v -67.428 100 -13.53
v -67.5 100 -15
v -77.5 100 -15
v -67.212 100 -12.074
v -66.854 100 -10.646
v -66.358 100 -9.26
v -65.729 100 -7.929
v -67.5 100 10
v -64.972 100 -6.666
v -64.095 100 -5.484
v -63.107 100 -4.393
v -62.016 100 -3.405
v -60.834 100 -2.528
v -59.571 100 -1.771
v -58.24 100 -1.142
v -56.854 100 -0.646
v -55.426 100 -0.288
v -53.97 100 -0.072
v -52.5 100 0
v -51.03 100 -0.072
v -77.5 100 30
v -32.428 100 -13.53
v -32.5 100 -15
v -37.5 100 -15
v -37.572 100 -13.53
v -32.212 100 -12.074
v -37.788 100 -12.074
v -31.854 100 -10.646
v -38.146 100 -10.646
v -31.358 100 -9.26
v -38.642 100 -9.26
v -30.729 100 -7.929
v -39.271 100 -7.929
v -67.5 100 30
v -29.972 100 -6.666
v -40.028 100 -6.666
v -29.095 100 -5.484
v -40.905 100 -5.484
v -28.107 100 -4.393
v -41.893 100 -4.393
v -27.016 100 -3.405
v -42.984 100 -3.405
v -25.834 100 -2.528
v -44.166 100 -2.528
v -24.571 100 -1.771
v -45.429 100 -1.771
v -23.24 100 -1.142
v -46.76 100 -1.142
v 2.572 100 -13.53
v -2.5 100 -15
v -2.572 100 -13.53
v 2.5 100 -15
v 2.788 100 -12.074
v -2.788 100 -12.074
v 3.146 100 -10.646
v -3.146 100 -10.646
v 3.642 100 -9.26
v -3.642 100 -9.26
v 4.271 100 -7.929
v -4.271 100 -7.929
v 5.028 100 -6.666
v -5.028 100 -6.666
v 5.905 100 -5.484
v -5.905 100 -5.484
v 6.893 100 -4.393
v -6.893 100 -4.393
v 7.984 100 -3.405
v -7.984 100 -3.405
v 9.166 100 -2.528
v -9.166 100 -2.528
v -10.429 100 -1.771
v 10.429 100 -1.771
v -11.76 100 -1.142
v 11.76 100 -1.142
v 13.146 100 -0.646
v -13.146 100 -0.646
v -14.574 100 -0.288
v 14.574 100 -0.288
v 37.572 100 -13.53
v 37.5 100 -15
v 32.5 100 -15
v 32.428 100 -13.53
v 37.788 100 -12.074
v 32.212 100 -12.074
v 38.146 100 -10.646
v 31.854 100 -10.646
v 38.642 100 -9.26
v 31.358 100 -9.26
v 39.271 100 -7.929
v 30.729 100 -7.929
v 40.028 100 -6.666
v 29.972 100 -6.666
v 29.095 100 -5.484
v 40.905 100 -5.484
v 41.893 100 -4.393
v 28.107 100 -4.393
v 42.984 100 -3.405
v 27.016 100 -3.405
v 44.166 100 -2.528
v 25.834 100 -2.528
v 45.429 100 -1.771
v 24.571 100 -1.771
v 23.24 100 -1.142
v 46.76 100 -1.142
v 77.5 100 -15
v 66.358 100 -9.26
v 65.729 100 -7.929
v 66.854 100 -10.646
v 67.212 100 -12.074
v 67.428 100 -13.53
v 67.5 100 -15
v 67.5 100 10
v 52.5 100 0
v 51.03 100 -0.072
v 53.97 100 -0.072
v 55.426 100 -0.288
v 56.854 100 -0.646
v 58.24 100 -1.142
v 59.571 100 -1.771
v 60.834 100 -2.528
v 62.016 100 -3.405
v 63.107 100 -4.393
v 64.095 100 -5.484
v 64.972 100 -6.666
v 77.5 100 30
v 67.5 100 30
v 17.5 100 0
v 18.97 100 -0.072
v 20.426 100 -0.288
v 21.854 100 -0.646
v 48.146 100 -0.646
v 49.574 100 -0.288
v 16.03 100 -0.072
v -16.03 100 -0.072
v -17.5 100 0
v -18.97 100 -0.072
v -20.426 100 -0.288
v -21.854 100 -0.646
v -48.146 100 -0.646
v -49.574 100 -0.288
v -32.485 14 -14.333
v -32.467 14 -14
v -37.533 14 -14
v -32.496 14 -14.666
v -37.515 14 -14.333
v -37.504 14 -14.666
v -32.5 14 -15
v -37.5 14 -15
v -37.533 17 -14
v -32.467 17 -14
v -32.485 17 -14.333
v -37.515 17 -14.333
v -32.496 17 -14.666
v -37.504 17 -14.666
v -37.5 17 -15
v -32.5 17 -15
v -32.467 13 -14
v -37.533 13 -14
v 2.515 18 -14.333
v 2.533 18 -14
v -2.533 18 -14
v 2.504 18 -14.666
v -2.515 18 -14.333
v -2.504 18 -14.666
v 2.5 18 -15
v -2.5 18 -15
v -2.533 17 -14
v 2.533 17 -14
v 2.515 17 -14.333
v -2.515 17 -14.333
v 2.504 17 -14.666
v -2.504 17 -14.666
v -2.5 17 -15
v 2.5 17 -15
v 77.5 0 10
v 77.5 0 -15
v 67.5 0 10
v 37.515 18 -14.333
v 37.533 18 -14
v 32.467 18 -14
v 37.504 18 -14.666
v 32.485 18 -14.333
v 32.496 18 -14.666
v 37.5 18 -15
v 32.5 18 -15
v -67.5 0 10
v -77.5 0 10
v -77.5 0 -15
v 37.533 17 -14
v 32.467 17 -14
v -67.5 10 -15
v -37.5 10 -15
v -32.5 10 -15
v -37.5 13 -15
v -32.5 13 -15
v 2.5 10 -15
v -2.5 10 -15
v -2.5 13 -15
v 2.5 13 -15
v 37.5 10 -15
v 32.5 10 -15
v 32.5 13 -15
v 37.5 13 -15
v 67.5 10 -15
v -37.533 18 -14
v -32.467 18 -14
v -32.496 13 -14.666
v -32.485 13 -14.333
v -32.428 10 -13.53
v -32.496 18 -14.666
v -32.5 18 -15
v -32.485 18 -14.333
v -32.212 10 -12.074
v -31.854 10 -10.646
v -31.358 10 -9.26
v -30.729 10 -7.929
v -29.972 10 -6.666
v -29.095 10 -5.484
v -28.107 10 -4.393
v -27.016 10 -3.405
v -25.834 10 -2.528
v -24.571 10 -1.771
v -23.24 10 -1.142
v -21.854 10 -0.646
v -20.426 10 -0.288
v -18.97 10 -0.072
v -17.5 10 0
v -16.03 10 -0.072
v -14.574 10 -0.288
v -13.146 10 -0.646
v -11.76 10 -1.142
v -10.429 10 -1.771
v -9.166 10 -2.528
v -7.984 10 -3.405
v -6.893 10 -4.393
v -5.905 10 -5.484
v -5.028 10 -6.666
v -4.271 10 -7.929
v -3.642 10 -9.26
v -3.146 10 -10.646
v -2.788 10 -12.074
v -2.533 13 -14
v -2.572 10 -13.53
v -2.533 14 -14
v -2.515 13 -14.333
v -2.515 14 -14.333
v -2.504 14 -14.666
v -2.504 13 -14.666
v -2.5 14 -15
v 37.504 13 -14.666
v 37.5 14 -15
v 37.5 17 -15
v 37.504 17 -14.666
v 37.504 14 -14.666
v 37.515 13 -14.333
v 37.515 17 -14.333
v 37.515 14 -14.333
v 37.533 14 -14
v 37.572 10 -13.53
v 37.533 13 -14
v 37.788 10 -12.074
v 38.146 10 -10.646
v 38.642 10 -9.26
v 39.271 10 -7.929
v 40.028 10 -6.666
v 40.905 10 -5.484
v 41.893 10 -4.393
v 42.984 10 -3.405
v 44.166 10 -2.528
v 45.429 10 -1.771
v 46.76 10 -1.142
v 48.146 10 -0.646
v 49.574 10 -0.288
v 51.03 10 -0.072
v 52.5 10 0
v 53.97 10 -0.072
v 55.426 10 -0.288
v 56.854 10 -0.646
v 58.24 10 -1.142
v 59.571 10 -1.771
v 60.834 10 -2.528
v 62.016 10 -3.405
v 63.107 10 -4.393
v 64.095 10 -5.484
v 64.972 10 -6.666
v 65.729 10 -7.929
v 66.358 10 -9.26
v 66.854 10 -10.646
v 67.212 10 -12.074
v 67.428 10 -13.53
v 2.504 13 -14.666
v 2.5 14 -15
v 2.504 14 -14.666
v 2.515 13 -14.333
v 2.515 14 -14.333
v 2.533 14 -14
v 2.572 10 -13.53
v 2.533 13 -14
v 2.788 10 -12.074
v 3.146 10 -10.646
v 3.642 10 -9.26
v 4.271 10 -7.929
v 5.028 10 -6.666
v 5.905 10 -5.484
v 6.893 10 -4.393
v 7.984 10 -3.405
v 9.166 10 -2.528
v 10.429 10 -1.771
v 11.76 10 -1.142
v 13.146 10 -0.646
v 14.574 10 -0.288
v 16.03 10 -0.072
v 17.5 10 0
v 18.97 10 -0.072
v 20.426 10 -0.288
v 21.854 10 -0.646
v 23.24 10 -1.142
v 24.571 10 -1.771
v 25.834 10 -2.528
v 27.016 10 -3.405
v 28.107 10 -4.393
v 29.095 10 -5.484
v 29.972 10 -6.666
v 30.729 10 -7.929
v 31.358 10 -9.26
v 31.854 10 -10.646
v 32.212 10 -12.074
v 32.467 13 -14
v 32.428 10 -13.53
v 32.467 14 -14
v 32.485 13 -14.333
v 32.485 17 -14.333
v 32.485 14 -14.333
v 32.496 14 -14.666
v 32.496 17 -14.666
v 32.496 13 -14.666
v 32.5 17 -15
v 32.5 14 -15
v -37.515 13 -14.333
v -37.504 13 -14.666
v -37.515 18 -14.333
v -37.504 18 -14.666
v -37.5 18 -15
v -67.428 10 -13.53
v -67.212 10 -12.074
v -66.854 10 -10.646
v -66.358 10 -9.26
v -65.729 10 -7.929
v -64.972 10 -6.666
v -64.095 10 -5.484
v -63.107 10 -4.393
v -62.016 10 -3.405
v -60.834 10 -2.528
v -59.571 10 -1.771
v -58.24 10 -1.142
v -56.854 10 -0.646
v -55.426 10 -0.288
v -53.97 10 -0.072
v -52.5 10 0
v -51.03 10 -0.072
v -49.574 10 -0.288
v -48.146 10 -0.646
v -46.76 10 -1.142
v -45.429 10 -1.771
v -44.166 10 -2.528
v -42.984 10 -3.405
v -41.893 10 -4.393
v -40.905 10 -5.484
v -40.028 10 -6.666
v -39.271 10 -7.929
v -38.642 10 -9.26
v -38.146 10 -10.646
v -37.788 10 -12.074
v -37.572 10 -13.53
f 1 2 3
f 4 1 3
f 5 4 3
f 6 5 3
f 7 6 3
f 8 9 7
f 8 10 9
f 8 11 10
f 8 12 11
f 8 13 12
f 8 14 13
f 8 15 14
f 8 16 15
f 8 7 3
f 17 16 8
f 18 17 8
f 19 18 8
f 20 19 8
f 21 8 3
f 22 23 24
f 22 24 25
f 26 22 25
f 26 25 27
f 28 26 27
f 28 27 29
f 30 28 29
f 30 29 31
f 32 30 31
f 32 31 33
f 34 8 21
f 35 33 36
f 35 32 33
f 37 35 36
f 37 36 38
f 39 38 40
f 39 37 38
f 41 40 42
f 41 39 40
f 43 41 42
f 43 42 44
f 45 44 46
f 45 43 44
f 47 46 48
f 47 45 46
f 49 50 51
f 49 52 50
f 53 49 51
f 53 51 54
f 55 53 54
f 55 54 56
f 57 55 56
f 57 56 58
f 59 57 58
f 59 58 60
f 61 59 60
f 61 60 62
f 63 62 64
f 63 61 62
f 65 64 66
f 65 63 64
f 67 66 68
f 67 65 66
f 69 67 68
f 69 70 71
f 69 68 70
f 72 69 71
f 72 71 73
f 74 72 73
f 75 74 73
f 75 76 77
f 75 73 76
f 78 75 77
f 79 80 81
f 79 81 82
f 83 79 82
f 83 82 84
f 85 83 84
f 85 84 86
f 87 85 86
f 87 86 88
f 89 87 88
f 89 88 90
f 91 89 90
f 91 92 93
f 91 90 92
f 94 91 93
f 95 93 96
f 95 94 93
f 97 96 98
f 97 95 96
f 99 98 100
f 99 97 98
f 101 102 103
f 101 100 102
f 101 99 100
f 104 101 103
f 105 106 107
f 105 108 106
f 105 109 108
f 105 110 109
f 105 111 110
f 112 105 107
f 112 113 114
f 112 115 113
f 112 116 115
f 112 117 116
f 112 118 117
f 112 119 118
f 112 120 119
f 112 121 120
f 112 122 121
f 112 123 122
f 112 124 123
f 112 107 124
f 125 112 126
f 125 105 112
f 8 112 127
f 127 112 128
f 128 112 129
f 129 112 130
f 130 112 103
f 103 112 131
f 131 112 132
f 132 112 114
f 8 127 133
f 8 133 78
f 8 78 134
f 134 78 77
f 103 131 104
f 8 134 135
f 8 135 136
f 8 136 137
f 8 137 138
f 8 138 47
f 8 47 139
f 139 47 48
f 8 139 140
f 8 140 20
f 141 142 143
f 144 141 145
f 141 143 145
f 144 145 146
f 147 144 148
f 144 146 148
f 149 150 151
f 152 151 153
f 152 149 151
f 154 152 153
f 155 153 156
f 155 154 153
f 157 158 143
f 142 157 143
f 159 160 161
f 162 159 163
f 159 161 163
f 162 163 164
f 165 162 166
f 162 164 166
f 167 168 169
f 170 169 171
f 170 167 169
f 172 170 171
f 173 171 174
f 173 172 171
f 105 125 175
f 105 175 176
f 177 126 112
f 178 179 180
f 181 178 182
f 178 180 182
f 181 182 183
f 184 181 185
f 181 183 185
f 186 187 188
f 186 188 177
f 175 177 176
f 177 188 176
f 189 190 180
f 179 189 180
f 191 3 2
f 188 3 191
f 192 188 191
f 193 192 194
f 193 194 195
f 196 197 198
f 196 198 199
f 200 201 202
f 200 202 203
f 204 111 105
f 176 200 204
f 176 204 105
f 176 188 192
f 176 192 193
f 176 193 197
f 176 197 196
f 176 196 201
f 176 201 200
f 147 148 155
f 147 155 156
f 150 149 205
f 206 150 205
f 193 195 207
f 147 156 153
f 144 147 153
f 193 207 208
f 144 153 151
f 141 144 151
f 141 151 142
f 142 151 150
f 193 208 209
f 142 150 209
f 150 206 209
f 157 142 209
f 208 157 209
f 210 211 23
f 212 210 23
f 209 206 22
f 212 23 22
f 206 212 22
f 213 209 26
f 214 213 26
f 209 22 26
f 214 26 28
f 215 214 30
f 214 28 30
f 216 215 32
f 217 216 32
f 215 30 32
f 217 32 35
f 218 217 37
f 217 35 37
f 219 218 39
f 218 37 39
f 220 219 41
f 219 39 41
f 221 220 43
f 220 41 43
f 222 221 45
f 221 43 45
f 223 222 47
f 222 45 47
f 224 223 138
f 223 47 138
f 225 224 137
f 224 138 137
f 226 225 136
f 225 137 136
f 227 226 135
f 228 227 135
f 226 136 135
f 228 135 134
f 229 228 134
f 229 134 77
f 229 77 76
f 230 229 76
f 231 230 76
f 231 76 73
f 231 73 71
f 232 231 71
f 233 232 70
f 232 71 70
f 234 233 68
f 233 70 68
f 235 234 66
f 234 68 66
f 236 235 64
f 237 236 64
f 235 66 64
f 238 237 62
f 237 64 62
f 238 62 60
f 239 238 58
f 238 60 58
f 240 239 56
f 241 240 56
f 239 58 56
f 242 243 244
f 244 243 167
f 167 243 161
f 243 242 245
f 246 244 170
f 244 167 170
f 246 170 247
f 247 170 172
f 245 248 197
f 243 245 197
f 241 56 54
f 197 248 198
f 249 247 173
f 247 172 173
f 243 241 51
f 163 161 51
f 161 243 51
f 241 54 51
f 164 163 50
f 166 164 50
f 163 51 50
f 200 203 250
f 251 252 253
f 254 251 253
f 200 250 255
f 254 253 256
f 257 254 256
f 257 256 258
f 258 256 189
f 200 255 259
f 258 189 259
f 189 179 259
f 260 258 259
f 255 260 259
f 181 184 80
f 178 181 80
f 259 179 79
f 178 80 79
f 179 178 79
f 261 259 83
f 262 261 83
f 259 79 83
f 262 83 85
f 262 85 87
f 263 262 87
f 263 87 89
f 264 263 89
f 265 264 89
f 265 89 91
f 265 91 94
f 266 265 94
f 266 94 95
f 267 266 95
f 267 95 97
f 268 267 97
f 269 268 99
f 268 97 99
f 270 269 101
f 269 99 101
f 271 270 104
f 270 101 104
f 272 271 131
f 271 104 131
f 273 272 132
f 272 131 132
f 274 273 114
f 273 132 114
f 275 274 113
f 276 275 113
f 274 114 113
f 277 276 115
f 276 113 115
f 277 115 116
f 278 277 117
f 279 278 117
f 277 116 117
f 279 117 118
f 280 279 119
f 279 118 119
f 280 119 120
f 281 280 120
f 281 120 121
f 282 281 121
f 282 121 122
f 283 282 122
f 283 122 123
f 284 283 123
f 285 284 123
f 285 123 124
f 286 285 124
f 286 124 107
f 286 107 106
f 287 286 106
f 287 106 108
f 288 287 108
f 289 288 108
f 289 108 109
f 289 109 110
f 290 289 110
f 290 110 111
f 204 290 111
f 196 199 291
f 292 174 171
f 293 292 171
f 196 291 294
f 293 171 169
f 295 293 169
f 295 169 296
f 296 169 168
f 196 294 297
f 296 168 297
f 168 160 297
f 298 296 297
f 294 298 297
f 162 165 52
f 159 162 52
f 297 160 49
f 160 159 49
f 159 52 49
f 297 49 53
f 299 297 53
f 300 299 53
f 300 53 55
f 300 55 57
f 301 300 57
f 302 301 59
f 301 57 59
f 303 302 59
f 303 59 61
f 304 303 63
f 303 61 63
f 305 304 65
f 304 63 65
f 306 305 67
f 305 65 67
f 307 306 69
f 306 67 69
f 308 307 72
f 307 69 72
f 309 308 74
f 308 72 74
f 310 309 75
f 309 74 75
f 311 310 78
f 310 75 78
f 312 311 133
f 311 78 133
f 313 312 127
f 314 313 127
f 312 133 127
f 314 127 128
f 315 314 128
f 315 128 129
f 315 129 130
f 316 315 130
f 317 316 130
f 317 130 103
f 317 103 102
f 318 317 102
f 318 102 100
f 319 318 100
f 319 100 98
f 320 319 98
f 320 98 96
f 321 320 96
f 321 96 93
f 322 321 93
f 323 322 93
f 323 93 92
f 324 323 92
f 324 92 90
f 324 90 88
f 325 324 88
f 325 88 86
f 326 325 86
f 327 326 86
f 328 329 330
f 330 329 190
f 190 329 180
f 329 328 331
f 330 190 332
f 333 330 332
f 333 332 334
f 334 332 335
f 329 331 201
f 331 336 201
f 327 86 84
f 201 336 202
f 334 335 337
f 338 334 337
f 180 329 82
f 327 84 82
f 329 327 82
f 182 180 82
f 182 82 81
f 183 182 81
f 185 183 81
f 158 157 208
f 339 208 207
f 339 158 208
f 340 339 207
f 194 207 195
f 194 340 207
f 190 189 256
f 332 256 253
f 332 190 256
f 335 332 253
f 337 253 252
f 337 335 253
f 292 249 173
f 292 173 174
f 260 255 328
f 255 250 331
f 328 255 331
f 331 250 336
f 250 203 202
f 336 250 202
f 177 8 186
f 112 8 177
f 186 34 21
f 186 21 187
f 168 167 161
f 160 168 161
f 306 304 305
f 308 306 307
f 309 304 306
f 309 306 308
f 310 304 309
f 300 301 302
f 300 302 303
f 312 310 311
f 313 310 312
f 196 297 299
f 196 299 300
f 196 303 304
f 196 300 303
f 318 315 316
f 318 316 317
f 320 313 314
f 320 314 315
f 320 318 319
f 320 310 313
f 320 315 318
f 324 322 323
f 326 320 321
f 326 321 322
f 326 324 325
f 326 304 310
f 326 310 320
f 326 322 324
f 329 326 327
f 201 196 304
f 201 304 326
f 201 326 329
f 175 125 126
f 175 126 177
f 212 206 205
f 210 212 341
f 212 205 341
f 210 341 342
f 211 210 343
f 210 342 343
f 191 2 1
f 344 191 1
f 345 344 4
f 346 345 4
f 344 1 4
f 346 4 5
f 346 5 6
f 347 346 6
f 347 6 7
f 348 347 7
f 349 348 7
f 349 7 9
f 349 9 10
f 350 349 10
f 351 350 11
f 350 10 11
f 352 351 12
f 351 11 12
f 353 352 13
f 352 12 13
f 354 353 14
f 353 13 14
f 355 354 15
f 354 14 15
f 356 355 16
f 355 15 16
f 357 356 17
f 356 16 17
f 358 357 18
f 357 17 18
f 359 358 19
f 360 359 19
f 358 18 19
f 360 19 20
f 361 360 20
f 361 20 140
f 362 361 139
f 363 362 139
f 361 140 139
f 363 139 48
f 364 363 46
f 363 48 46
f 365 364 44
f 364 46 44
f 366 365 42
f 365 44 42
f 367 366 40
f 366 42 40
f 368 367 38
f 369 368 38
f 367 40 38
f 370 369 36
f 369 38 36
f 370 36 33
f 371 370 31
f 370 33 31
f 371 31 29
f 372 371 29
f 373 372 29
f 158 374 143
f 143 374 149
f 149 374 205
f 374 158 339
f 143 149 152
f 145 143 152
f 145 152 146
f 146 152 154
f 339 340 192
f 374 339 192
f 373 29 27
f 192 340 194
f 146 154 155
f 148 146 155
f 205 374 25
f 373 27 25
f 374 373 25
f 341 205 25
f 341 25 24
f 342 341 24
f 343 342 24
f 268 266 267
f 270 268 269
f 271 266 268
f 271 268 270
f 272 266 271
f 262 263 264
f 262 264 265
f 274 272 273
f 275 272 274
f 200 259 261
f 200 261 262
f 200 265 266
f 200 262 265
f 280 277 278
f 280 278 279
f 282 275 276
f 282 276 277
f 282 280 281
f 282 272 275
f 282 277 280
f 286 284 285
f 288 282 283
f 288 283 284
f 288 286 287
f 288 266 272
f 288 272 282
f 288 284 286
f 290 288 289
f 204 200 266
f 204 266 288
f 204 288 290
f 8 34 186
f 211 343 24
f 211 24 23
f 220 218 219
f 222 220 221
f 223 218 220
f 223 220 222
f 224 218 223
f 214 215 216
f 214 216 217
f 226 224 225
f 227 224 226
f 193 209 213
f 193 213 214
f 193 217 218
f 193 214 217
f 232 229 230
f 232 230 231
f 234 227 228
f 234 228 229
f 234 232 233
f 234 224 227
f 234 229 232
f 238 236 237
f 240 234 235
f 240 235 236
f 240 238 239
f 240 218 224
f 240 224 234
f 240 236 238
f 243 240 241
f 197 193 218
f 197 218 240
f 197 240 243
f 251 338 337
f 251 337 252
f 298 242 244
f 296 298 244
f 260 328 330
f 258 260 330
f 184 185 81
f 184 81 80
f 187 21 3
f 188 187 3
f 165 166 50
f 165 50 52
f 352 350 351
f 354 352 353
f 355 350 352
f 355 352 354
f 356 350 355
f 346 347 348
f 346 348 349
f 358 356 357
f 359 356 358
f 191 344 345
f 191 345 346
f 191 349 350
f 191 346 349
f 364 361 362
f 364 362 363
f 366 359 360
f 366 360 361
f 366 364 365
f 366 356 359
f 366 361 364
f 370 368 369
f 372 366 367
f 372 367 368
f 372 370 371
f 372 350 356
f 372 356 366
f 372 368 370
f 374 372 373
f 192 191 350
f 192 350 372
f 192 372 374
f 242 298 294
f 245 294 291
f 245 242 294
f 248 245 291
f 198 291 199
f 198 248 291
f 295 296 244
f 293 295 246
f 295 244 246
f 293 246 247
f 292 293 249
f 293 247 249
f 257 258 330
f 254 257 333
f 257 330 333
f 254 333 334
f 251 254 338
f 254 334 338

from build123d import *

# Parameters (mm, degrees)
SKETCH1_W               = 155
SKETCH1_H               = 30
BOSS_EXTRUDE1_DEPTH     = 100
SKETCH2_R               = 15
CUT_EXTRUDE2_DEPTH      = 90
SKETCH4_W               = 155
SKETCH4_H               = 100
CUT_EXTRUDE3_DEPTH      = 5
BOSS_EXTRUDE2_DEPTH     = 155
SKETCH6_W               = 135
SKETCH6_H               = 20
CUT_EXTRUDE4_DEPTH      = 145
SKETCH7_W               = 5
SKETCH7_H               = 1
CUT_EXTRUDE6_DEPTH      = 1
CUT_EXTRUDE7_DEPTH      = 6
CUT_EXTRUDE7_DEPTH_BACK = 71
SKETCH8_W               = 1
SKETCH8_H               = 1
SKETCH9_W               = 5
SKETCH9_H               = 1
CUT_EXTRUDE8_DEPTH      = 1
CUT_EXTRUDE9_DEPTH      = 6
CUT_EXTRUDE9_DEPTH_BACK = 71
SKETCH10_W              = 1
SKETCH10_H              = 1


with BuildPart() as part:
    # Sketch1 → Boss-Extrude1 (new body)
    with BuildSketch(Plane(origin=(0, 0, 0), x_dir=(1, 0, 0), z_dir=(0, 1, 0))):
        Rectangle(SKETCH1_W, SKETCH1_H)
    extrude(amount=BOSS_EXTRUDE1_DEPTH)

    # Sketch2 → Cut-Extrude2 (cut)
    with BuildSketch(Plane(origin=(0, 100, 0), x_dir=(1, 0, 0), z_dir=(0, 1, 0))):
        with Locations((-52.5, 15)):
            Circle(SKETCH2_R)
        with Locations((-17.5, 15)):
            Circle(SKETCH2_R)
        with Locations((17.5, 15)):
            Circle(SKETCH2_R)
        with Locations((52.5, 15)):
            Circle(SKETCH2_R)
    extrude(amount=-CUT_EXTRUDE2_DEPTH, mode=Mode.SUBTRACT)

    # Sketch4 → Cut-Extrude3 (cut)
    with BuildSketch(Plane.XY.offset(15)):
        with Locations((0, 50)):
            Rectangle(SKETCH4_W, SKETCH4_H)
    extrude(amount=-CUT_EXTRUDE3_DEPTH, mode=Mode.SUBTRACT)

    # Sketch5 → Boss-Extrude2 (add)
    with BuildSketch(Plane(origin=(77.5, 0, 0), x_dir=(0, 0, -1), z_dir=(1, 0, 0))):
        Polygon((-10, 100), (-30, 100), (-10, 0), align=None)
    extrude(amount=-BOSS_EXTRUDE2_DEPTH)

    # Sketch6 → Cut-Extrude4 (cut)
    with BuildSketch(Plane(origin=(0, 100, 0), x_dir=(1, 0, 0), z_dir=(0, 1, 0))):
        with Locations((0, -20)):
            Rectangle(SKETCH6_W, SKETCH6_H)
    extrude(amount=-CUT_EXTRUDE4_DEPTH, mode=Mode.SUBTRACT)

    # Sketch7 → Cut-Extrude6 (cut)
    with BuildSketch(Plane(origin=(0, 0, -15), x_dir=(-1, 0, 0), z_dir=(0, 0, -1))):
        with Locations((-35, 13.5)):
            Rectangle(SKETCH7_W, SKETCH7_H)
    extrude(amount=-CUT_EXTRUDE6_DEPTH, mode=Mode.SUBTRACT)

    # Sketch8 → Cut-Extrude7 (cut, two sides: drawn at the far end of the back side and taken through both)
    with BuildSketch(Plane(origin=(32.5, 0, 0), x_dir=(0, 0, -1), z_dir=(1, 0, 0)).offset(-CUT_EXTRUDE7_DEPTH_BACK)):
        with Locations((14.5, 13.5)):
            Rectangle(SKETCH8_W, SKETCH8_H)
    extrude(amount=CUT_EXTRUDE7_DEPTH + CUT_EXTRUDE7_DEPTH_BACK, mode=Mode.SUBTRACT)

    # Sketch9 → Cut-Extrude8 (cut)
    with BuildSketch(Plane(origin=(0, 0, -15), x_dir=(-1, 0, 0), z_dir=(0, 0, -1))):
        with Locations((-35, 17.5)):
            Rectangle(SKETCH9_W, SKETCH9_H)
    extrude(amount=-CUT_EXTRUDE8_DEPTH, mode=Mode.SUBTRACT)

    # Sketch10 → Cut-Extrude9 (cut, two sides: drawn at the far end of the back side and taken through both)
    with BuildSketch(Plane(origin=(32.5, 0, 0), x_dir=(0, 0, -1), z_dir=(1, 0, 0)).offset(-CUT_EXTRUDE9_DEPTH_BACK)):
        with Locations((14.5, 17.5)):
            Rectangle(SKETCH10_W, SKETCH10_H)
    extrude(amount=CUT_EXTRUDE9_DEPTH + CUT_EXTRUDE9_DEPTH_BACK, mode=Mode.SUBTRACT)


solid = part.part
